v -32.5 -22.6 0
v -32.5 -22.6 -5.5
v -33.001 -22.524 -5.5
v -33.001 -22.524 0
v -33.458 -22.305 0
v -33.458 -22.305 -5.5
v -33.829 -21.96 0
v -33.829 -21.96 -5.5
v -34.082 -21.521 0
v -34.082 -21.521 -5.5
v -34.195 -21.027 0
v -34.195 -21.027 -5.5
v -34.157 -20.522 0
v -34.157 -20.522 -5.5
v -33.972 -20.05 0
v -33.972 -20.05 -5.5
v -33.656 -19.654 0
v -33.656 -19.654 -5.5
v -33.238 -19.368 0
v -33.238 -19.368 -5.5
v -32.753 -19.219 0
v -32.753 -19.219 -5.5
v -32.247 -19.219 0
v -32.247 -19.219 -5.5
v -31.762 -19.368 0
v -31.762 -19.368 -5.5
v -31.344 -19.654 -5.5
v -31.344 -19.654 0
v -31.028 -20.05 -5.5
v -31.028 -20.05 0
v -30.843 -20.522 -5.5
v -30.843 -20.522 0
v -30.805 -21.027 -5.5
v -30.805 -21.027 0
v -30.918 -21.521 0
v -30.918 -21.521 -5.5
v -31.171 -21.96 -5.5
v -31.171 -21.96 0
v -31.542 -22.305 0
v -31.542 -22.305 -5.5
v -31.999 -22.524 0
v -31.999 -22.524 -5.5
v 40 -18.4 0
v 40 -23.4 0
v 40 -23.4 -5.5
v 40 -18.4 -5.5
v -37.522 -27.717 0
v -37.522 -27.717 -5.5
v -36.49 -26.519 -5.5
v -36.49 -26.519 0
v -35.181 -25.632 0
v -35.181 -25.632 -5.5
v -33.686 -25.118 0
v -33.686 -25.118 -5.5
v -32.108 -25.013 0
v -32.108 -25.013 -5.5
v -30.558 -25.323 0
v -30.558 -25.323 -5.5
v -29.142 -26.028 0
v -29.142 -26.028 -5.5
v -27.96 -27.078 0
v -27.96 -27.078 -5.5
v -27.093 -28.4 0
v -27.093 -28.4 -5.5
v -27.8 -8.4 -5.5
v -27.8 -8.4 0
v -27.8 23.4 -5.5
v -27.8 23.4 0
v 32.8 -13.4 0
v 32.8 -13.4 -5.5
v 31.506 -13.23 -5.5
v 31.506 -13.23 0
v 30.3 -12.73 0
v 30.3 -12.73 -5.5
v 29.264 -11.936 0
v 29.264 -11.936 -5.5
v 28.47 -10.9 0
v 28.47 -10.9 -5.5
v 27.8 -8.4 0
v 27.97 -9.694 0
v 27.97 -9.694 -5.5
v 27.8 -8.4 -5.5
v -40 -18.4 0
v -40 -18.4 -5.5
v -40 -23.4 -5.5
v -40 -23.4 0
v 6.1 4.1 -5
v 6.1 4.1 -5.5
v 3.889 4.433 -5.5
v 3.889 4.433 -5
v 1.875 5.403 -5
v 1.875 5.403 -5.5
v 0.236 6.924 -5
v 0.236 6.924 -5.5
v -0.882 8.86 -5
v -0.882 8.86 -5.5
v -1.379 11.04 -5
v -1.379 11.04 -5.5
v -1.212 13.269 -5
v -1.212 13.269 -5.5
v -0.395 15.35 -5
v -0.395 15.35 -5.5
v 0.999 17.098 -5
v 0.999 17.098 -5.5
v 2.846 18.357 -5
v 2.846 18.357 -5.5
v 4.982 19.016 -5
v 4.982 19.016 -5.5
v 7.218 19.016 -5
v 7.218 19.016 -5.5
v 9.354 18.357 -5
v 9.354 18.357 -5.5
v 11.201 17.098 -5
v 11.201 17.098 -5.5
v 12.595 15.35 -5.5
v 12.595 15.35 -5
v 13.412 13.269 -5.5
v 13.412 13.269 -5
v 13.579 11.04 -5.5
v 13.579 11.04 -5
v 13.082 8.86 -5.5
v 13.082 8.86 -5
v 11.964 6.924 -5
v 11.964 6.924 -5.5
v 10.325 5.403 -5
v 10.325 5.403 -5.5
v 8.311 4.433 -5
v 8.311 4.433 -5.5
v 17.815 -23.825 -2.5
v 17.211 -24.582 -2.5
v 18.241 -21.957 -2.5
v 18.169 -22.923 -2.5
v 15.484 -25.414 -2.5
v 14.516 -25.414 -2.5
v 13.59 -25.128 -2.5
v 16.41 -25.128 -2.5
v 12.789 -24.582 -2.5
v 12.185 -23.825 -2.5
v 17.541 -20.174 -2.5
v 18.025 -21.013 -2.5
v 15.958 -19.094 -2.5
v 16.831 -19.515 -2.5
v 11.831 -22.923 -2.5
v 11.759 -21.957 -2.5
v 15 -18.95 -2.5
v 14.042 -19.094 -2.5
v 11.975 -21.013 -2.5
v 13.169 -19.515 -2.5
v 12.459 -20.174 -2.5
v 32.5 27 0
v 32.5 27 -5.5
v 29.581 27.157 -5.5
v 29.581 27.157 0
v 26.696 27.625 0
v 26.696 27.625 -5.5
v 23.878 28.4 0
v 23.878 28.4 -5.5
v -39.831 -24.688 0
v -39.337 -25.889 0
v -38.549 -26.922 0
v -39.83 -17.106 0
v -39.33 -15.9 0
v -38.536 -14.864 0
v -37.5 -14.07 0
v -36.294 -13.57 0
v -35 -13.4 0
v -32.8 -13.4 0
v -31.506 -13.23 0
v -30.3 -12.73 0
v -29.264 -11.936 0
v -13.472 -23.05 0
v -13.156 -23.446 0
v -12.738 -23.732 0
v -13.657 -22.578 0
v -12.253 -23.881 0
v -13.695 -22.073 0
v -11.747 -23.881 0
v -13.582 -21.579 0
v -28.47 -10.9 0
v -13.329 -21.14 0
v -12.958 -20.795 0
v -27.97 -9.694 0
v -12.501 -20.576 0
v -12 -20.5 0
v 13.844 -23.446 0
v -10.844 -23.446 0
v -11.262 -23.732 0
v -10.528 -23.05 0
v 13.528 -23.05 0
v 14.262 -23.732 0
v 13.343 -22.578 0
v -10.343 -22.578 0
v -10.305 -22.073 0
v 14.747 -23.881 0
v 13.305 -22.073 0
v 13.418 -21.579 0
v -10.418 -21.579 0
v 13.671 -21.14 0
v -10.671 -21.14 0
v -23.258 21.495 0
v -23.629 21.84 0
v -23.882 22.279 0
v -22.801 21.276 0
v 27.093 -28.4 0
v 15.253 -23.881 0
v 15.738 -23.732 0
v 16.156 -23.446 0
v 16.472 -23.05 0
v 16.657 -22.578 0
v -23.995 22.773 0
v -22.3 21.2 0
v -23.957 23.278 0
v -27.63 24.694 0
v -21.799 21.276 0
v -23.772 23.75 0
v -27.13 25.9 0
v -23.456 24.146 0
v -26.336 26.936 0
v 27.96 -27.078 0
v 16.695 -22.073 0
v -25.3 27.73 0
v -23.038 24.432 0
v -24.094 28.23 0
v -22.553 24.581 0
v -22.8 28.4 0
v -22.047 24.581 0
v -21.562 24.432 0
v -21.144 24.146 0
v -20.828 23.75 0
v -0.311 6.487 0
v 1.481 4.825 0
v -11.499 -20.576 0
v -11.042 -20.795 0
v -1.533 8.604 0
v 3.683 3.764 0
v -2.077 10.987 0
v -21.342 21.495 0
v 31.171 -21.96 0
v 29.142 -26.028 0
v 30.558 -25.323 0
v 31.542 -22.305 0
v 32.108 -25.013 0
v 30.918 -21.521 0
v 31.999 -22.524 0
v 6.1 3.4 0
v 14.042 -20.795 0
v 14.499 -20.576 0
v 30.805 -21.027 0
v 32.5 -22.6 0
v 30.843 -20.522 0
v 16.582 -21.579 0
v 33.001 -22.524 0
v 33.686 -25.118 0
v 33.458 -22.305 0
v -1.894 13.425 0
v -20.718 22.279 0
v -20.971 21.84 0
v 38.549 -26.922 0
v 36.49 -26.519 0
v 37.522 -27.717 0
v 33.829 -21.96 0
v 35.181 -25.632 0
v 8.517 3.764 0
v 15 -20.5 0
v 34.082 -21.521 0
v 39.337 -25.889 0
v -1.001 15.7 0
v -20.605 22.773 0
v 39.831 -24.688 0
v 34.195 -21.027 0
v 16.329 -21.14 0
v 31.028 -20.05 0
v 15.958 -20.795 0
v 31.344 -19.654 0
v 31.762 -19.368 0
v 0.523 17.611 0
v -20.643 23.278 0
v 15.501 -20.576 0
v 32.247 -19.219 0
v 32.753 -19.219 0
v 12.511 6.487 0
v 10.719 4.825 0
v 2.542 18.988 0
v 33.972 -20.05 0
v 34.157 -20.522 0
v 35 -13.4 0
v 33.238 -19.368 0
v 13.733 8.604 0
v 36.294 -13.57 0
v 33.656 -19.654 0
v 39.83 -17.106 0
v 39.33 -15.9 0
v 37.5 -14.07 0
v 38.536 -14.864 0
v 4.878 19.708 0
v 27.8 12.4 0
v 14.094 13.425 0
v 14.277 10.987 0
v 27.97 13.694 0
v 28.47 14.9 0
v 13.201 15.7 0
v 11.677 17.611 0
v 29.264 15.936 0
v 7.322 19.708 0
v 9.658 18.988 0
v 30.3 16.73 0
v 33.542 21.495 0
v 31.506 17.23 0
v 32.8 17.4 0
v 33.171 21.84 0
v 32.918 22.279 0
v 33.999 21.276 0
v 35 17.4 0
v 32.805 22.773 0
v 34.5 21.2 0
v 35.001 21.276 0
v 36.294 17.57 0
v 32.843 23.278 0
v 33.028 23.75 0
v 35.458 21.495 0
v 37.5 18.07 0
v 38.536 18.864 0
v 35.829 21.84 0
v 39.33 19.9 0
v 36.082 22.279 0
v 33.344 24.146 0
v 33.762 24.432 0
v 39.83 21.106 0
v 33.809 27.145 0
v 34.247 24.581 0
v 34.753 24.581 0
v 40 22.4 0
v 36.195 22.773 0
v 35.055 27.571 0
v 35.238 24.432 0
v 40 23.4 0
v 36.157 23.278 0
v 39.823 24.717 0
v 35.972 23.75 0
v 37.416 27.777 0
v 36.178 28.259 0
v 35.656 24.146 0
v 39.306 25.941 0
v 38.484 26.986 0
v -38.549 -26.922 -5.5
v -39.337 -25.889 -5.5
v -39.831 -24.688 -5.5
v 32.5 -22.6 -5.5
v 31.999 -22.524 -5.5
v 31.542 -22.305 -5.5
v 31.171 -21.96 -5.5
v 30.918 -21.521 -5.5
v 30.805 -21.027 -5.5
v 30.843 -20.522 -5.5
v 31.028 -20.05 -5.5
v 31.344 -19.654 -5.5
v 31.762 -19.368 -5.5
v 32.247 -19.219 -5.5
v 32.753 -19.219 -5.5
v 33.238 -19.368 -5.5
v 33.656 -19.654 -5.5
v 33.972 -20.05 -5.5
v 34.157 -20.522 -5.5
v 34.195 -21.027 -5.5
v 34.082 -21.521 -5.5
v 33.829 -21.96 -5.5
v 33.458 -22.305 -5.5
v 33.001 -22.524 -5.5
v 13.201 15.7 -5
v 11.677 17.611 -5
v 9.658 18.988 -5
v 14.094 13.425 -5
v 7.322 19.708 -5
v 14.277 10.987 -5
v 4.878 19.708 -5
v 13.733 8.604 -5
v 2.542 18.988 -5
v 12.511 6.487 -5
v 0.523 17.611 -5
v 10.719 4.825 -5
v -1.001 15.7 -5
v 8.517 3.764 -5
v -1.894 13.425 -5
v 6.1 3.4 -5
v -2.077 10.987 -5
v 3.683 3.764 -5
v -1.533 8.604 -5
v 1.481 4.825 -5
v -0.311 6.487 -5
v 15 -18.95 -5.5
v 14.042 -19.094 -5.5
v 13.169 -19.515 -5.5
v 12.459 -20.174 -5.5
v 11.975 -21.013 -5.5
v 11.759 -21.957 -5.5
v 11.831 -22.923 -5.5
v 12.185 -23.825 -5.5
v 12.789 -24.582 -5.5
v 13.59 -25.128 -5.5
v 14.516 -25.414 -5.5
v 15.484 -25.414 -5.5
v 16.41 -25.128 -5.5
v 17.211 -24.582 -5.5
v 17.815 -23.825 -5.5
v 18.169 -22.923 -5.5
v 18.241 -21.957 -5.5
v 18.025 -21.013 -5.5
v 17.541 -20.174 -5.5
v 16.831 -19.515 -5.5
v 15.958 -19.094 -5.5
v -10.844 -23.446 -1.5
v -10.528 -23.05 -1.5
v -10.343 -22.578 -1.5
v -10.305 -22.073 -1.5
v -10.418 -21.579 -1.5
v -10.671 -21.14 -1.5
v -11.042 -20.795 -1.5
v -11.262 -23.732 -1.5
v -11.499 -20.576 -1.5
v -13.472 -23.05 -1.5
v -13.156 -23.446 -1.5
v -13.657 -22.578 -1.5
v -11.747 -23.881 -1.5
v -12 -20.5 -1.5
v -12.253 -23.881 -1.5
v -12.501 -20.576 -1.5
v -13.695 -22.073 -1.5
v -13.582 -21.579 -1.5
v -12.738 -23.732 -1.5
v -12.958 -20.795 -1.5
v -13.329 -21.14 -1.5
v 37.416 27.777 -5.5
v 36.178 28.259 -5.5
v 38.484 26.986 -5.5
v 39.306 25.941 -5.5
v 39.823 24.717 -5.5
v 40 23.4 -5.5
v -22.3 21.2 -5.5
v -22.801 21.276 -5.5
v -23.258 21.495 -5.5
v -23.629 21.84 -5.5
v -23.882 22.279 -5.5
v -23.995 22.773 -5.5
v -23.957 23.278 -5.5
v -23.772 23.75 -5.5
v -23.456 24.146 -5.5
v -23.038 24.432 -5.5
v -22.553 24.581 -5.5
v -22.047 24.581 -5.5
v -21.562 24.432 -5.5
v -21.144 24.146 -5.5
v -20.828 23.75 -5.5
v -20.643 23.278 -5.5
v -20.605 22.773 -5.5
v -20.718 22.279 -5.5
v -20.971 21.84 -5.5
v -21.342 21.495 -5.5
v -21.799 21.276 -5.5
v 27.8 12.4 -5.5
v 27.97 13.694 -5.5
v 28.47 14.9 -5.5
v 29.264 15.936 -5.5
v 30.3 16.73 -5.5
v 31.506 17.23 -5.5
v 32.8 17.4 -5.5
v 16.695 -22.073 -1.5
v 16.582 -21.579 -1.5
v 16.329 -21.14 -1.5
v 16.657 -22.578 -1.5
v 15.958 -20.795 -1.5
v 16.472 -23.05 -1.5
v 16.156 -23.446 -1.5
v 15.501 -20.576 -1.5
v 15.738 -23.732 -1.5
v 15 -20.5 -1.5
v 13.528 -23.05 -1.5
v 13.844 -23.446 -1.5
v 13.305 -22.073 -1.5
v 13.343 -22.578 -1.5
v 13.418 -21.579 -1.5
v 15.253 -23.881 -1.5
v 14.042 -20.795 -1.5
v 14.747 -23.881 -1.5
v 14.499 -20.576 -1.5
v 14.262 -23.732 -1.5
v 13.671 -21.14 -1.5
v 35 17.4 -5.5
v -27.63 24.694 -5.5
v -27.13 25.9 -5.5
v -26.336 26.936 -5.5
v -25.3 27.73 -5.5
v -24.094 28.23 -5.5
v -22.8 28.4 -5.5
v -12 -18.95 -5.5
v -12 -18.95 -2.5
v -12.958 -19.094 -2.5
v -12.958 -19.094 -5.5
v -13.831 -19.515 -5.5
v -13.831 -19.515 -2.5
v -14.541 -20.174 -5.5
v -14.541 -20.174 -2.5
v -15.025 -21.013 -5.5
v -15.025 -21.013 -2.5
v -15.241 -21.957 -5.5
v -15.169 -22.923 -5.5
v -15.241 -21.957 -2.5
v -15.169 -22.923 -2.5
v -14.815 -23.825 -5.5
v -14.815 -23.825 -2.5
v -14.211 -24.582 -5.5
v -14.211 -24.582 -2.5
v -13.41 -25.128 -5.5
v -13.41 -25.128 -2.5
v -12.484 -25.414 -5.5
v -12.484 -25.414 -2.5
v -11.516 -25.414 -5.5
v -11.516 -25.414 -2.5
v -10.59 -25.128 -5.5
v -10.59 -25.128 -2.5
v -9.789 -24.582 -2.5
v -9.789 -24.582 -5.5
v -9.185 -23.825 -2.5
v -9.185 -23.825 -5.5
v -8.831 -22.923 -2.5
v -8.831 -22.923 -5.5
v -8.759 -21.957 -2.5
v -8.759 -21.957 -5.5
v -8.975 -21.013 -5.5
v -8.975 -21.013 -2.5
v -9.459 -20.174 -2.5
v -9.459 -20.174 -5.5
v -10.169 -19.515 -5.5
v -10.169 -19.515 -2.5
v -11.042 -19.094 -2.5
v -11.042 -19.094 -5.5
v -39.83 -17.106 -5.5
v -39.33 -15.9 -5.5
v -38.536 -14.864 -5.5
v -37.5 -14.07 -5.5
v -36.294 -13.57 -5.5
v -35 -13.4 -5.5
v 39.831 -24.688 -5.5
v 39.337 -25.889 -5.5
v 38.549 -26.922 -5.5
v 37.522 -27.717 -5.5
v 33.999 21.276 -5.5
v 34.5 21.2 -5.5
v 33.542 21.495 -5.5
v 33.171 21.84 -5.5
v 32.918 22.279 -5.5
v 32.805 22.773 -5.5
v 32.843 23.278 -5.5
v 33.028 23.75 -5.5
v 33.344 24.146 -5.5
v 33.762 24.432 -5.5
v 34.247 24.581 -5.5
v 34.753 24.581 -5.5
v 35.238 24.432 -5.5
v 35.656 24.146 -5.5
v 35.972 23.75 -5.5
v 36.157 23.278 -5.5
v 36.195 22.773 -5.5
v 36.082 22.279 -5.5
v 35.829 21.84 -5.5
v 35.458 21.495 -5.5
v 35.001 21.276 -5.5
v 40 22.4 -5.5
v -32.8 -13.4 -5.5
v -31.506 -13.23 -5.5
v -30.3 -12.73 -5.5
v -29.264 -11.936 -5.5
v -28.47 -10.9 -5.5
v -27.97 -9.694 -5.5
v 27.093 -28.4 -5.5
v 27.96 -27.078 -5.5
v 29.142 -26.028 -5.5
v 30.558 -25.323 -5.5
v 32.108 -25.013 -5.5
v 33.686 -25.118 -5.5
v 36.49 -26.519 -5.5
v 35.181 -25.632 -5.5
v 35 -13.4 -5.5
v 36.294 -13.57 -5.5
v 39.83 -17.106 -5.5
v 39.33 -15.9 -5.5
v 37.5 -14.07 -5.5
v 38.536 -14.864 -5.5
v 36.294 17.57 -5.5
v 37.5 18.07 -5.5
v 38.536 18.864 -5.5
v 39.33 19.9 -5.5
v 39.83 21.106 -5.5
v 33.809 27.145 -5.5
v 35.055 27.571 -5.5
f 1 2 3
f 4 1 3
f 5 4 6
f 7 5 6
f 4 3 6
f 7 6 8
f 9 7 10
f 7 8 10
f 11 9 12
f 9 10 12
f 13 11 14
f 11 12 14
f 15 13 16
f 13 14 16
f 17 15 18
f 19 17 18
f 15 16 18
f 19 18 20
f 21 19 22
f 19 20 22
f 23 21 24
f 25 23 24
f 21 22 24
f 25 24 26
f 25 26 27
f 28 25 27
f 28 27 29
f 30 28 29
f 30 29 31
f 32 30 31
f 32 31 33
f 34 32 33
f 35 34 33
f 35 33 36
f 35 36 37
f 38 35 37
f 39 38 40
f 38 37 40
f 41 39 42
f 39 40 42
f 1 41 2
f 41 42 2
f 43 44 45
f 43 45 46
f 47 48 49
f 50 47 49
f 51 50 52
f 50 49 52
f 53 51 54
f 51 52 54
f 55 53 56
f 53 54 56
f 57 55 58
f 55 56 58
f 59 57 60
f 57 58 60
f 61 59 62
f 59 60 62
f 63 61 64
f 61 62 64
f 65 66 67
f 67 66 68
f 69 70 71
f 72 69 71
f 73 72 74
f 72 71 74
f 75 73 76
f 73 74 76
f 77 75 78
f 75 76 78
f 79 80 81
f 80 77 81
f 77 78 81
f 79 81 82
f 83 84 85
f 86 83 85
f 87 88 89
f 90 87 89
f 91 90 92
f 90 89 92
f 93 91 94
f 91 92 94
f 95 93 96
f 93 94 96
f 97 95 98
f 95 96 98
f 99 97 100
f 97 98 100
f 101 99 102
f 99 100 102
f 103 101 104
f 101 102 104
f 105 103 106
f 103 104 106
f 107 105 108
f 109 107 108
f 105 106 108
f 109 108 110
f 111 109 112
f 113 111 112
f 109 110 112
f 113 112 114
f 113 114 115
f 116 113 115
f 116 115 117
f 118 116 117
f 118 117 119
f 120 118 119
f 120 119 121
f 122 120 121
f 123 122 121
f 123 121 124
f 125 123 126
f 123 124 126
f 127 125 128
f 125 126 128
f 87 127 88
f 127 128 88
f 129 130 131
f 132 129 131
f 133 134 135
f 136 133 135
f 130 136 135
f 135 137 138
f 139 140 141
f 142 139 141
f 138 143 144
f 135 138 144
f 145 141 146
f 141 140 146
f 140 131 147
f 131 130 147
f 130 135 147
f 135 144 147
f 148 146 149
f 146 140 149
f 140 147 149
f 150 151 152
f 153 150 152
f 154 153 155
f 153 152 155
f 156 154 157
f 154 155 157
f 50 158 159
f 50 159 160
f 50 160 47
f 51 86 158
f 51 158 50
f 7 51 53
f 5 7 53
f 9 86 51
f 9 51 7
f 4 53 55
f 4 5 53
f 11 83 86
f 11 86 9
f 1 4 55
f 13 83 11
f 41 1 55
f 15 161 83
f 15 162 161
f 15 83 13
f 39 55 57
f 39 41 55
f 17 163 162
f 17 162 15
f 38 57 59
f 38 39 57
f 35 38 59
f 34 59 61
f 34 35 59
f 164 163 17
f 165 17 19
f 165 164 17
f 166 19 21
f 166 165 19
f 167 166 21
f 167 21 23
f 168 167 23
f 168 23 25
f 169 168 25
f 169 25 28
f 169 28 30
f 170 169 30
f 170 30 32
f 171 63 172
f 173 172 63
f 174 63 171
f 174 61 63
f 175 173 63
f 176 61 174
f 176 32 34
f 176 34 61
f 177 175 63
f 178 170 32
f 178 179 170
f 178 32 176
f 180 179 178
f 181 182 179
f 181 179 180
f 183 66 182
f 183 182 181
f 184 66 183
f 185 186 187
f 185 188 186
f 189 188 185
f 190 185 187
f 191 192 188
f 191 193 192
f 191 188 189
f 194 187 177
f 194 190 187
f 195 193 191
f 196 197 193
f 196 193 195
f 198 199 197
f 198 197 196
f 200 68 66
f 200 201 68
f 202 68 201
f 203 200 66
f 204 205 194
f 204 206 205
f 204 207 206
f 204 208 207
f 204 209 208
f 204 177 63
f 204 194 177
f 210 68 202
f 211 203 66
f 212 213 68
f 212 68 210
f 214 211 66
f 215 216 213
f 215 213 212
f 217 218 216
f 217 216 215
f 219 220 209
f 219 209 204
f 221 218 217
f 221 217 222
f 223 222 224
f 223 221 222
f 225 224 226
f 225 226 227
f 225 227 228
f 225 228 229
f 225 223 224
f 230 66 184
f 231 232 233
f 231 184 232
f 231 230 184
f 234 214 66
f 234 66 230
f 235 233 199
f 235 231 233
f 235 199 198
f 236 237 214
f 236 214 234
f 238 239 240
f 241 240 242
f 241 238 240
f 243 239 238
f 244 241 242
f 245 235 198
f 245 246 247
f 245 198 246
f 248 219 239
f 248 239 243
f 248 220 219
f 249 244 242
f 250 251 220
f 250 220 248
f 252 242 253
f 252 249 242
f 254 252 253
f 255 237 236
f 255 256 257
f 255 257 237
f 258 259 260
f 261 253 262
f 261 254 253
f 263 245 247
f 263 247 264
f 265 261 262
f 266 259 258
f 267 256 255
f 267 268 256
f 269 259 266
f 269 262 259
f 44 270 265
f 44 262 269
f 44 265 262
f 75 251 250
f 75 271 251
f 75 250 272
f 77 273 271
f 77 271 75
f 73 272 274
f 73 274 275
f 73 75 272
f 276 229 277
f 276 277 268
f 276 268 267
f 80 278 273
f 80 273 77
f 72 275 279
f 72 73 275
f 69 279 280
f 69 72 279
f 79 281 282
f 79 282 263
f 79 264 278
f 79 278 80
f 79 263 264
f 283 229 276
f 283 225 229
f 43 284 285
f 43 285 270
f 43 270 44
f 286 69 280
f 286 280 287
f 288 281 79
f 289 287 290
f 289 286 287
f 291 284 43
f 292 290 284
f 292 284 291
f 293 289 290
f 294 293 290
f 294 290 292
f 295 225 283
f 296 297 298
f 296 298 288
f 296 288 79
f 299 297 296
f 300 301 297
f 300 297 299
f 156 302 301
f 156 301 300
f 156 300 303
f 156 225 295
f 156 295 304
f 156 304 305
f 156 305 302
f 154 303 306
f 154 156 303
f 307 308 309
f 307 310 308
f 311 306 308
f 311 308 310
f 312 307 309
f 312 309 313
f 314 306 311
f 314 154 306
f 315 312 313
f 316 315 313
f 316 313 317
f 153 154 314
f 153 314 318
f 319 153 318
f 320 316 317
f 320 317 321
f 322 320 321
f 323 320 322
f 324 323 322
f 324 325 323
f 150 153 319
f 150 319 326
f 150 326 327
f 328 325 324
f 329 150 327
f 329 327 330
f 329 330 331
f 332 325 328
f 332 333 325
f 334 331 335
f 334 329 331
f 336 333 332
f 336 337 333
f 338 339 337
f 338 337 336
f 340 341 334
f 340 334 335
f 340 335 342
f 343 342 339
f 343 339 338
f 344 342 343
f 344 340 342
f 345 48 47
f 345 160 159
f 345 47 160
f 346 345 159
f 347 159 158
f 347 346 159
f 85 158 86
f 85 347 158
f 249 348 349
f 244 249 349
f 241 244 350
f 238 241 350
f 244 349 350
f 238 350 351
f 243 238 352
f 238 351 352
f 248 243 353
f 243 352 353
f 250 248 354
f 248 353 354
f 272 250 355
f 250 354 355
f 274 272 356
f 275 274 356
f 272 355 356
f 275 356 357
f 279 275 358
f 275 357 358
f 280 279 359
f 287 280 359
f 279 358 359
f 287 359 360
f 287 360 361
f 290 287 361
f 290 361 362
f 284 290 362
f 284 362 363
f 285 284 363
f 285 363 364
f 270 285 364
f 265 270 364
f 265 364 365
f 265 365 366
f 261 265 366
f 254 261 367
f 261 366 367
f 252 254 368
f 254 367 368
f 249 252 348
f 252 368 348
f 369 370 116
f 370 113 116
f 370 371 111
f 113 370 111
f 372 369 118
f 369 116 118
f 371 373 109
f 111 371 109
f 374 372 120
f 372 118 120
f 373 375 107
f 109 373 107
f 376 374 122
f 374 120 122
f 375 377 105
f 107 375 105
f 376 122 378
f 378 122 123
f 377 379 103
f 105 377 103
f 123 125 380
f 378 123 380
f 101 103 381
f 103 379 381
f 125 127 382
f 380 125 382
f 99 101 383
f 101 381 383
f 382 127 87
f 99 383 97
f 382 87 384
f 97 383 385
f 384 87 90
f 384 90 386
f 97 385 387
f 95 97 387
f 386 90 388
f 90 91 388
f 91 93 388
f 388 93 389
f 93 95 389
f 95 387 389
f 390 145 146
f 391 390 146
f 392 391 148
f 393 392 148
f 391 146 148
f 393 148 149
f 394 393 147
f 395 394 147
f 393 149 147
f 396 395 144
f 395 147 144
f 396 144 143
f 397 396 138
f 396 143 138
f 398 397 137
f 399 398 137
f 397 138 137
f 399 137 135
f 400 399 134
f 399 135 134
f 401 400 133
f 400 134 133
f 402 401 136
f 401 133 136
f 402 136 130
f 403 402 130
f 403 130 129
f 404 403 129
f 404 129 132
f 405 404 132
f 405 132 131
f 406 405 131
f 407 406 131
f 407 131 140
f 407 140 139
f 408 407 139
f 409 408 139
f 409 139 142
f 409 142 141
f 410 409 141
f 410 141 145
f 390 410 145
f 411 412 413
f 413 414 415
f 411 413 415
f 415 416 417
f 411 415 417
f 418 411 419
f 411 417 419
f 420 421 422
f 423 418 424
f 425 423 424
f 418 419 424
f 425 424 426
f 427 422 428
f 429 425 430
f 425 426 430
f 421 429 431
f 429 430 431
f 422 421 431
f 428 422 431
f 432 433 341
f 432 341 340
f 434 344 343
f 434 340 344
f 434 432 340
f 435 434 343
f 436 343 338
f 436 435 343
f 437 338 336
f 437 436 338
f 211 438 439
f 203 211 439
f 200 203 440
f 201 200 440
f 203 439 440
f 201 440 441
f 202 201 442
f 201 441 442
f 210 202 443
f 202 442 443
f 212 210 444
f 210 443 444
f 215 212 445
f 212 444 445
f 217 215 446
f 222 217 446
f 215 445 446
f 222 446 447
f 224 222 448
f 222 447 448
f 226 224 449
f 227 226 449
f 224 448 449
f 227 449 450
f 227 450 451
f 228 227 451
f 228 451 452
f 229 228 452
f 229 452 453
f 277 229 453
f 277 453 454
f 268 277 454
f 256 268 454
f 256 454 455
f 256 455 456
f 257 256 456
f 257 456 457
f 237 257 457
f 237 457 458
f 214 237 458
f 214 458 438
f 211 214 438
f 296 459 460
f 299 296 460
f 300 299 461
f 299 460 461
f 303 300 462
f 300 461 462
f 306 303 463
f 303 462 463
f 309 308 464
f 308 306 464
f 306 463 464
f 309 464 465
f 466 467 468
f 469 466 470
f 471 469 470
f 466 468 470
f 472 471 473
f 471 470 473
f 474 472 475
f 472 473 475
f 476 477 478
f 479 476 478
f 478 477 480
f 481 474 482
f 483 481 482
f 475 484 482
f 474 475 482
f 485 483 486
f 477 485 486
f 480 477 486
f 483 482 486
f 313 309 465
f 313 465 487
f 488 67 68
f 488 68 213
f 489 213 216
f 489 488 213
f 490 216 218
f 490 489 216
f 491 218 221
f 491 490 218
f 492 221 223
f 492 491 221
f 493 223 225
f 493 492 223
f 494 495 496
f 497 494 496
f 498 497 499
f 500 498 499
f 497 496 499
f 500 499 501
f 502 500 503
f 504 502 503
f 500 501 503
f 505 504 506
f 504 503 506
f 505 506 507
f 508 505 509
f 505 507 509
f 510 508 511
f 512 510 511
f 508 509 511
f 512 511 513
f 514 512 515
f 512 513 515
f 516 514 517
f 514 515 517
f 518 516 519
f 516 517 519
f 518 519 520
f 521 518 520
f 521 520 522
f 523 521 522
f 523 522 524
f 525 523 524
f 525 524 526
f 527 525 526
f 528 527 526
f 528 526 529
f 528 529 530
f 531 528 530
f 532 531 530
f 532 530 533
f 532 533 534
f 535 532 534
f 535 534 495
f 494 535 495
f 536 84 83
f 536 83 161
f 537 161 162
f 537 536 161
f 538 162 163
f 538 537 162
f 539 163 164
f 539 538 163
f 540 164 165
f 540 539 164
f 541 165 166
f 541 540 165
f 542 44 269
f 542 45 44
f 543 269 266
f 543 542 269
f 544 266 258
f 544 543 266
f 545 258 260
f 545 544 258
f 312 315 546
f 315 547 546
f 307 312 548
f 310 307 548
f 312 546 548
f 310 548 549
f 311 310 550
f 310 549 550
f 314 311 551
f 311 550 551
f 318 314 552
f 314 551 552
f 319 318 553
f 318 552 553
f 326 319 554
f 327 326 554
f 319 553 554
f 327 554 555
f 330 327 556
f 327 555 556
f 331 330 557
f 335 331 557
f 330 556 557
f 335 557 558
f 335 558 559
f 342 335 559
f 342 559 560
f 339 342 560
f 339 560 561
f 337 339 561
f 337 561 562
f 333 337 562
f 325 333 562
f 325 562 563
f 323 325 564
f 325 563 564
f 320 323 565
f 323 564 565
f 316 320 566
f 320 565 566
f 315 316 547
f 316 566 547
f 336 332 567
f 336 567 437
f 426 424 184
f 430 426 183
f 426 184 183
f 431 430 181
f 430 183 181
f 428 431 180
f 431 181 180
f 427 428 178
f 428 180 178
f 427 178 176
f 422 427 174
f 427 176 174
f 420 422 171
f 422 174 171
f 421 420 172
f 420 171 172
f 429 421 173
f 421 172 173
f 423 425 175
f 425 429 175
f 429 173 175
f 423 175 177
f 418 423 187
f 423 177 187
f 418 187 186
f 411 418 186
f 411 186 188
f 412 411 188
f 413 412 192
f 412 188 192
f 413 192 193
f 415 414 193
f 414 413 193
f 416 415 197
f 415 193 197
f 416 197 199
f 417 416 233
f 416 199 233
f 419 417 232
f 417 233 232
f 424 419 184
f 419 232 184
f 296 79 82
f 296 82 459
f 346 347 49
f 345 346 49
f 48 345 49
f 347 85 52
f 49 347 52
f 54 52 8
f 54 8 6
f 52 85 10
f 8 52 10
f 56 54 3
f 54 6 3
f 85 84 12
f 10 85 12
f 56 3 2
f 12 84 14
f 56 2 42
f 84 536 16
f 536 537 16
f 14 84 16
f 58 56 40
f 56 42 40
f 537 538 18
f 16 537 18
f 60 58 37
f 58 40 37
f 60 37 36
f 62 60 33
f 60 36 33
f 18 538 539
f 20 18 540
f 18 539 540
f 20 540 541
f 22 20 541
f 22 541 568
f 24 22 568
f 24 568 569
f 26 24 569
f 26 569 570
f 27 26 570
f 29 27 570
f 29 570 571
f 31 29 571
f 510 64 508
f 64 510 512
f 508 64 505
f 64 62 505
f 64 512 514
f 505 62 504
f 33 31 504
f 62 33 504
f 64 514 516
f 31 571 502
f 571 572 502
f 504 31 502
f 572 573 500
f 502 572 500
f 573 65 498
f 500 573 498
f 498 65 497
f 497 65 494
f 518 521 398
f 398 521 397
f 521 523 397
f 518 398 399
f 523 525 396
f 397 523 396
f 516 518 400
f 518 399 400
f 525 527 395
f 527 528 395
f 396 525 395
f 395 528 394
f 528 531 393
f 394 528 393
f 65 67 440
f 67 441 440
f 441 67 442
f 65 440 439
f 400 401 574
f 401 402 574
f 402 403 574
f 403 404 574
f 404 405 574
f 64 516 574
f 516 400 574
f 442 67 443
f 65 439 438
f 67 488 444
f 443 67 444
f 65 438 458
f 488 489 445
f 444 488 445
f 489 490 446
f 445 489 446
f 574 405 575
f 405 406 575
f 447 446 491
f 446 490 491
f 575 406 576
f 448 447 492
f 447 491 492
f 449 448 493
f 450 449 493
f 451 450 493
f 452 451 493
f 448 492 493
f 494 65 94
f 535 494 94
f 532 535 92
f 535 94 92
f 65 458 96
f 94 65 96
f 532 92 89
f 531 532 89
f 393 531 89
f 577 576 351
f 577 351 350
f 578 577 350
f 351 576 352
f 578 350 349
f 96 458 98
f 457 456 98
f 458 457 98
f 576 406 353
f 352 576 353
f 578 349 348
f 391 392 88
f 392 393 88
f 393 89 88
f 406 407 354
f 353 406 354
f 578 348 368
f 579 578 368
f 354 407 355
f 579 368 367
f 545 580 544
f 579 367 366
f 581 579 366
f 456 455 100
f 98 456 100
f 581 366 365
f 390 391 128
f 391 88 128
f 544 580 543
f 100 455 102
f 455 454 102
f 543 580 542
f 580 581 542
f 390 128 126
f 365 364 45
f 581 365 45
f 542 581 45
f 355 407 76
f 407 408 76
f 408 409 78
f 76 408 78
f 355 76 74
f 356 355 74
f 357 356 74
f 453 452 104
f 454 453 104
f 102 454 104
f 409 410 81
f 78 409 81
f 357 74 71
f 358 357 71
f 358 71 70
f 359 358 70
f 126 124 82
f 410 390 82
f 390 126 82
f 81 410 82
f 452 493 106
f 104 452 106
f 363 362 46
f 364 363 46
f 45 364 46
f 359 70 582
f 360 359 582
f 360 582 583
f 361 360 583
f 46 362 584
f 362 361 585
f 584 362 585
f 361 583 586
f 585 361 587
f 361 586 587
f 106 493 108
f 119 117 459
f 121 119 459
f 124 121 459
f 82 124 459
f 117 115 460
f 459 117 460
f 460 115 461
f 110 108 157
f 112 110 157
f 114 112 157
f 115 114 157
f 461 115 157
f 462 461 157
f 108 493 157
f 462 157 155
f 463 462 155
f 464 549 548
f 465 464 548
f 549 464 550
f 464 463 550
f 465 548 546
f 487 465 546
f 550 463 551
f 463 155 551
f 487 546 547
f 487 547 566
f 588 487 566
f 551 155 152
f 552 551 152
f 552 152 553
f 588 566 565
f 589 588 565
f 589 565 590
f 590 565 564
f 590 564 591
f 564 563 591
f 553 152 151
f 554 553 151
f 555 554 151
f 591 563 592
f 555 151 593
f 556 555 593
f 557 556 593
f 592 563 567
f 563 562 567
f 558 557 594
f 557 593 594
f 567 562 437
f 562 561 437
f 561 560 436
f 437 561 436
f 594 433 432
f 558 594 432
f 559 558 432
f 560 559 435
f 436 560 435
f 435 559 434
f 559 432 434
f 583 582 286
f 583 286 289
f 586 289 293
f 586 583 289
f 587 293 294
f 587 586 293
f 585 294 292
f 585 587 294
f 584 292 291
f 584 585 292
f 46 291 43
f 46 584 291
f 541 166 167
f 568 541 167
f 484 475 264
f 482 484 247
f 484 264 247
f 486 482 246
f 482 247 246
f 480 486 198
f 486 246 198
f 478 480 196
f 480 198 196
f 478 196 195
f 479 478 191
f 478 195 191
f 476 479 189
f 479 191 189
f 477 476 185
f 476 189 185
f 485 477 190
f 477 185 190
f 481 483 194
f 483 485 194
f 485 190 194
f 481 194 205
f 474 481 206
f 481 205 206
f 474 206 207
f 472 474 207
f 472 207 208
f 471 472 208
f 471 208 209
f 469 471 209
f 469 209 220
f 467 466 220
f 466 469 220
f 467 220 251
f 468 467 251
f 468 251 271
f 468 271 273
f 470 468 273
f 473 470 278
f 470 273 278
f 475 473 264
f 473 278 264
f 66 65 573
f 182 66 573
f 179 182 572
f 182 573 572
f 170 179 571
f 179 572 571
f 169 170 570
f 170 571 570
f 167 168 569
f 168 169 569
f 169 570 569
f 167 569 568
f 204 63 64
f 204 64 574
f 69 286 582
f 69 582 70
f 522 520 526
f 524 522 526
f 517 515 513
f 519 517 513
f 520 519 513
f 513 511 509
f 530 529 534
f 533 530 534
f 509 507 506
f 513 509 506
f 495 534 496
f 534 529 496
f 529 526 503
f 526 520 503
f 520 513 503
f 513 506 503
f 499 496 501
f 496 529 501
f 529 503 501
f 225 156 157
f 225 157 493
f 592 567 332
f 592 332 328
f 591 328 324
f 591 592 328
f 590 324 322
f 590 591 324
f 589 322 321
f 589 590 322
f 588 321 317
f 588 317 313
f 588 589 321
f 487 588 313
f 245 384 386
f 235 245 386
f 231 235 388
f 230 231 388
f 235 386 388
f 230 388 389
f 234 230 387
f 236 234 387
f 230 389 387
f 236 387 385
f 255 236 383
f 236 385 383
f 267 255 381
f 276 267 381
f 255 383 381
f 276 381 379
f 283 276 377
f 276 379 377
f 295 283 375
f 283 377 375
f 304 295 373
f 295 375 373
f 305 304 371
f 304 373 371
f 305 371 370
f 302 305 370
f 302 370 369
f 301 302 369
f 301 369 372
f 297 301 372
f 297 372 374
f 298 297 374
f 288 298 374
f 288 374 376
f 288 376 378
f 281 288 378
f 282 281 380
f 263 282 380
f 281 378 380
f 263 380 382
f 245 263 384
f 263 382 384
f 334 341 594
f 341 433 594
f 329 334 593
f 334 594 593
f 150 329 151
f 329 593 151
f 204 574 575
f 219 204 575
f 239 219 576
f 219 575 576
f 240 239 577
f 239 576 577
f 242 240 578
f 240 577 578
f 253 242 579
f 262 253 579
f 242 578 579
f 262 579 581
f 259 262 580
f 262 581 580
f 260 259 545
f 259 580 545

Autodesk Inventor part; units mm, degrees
ref_plane "YZ Plane" through (0, 0, 0) normal (1, 0, 0) x (0, 1, 0)
ref_plane "XZ Plane" through (0, 0, 0) normal (0, 1, 0) x (-1, 0, 0)
ref_plane "XY Plane" through (0, 0, 0) normal (0, 0, 1) x (1, 0, 0)
sketch "Sketch1" plane through (0, 0, 0) normal (0, 0, 1) x (1, 0, 0)
  line L0 (-40, -28.4) -> (40, -28.4)
  line L1 (40, -28.4) -> (40, 28.4)
  line L2 (40, 28.4) -> (-40, 28.4)
  line L3 (-40, 28.4) -> (-40, -28.4)
  line L4 (-40, -28.4) -> (40, 28.4) construction
  line L5 (40, -28.4) -> (-40, 28.4) construction
  line L6 (-32.5, -20.9) -> (32.5, -20.9) construction
  line L7 (32.5, -20.9) -> (32.5, 20.9) construction
  line L8 (32.5, 20.9) -> (-32.5, 20.9) construction
  line L9 (-32.5, 20.9) -> (-32.5, -20.9) construction
  line L10 (-32.5, -20.9) -> (32.5, 20.9) construction
  line L11 (32.5, -20.9) -> (-32.5, 20.9) construction
  circle A0 centre (-32.5, -20.9) radius 3.25 construction
  circle A1 centre (32.5, 20.9) radius 3.25 construction
  circle A2 centre (32.5, -20.9) radius 3.25 construction
  line L12 (-40, -13.4) -> (-27.8, -13.4)
  line L13 (-27.8, -13.4) -> (-27.8, 28.4)
  circle A3 centre (-20.3, 20.9) radius 3.25 construction
  line L14 (40, 28.4) -> (32.5, 20.9)
  line L15 (-27.8, 28.4) -> (-20.3, 20.9) construction
  point P0 (0, 0)
  point P1 (34.5, 22.9)
  point P2 (-22.3, 22.9)
  dimension "d0" = 80
  dimension "d1" = 56.8
  dimension "d2" = 41.8
  dimension "d3" = 65
  dimension "d4" = 6.5
  dimension "d5" = 6.5
  dimension "d6" = 6.5
  dimension "d8" = 7.5
  dimension "d9" = 7.5
  dimension "d10" = 7.5
  dimension "d11" = 12.2
  dimension "d12" = 6.5
  dimension "d13" = 7.5
  dimension "d61" = 5.5
  dimension "d62" = 5.5
extrude "Base" add sketch "Sketch1" against normal blind 5.5 contours L3 L12 L13 L2 L1 L0
hole "Mounting Holes" at (32.5, -20.9, 0) at (-32.5, -20.9, 0) at (34.5, 22.9, 0) at (-22.3, 22.9, 0) direction (0, 0, -1) diameter 3.4 end through all clearance for "Socket Head Cap Screw" size "M3" standard "Ansi Metric M Profile"
fillet "Fillet1" radius 5 6 edges at (-40, -28.4, -2.75) (-40, -13.4, -2.75) (-27.8, -13.4, -2.75) (-27.8, 28.4, -2.75) (40, 28.4, -2.75) (40, -28.4, -2.75)
sketch "Sketch2" plane through (0, 0, 0) normal (0, 0, 1) x (1, 0, 0)
  circle A0 centre (32.5, -20.9) radius 1.7 projected
  point P0 (0, 0)
  point P1 (6.1, -6.4)
  point P2 (6.1, 11.6)
  dimension "d24" = 6.1
  dimension "d26" = 18
  dimension "d63" = 14.5
hole "Bearing Bore" at (6.1, 11.6, 0) direction (0, 0, -1) diameter 15 end through all counterbore diameter 16.4 counterbore depth 5
sketch "Sketch8" plane through (0, 0, 0) normal (0, 0, 1) x (1, 0, 0)
  line L0 (27.8, 17.4) -> (40, 17.4)
  line L1 (40, 17.4) -> (40, -13.4)
  line L2 (40, -13.4) -> (27.8, -13.4)
  line L3 (27.8, -13.4) -> (27.8, 17.4)
  line L4 (27.8, 17.4) -> (40, -13.4) construction
  line L5 (40, 17.4) -> (27.8, -13.4) construction
  circle A0 centre (34.5, 22.9) radius 1.7 projected
  circle A1 centre (32.5, -20.9) radius 1.7 projected
  line L6 (40, -23.4) -> (40, 23.4) projected
  line L7 (-35, -28.4) -> (35, -28.4) projected
  point P0 (0, 0)
  point P1 (33.9, 2)
  dimension "d73" = 12.2
  dimension "d77" = 15
  dimension "d78" = 7.5
  dimension "d79" = 5.5
extrude "Clamp Clearance" cut sketch "Sketch8" against normal blind 10 contours L0 L1 L2 L3
fillet "Fillet3" radius 5 2 edges at (40, 17.4, -2.75) (40, -13.4, -2.75)
sketch "Sketch9" plane through (0, 0, -5.5) normal (0, 0, -1) x (-1, 0, 0)
  circle A0 centre (-34.5, 22.9) radius 1.7 projected
  arc A1 (-32.5, 33) -> (-22.5, 35.5) centre (-32.5, 54.25) ccw construction
  arc A2 (-32.5, 27) -> (-19.6765, 30.2059) centre (-32.5, 54.25) ccw
  arc A3 (-32.5, 39) -> (-25.3235, 40.7941) centre (-32.5, 54.25) ccw
  arc A4 (-32.5, 39) -> (-32.5, 27) centre (-32.5, 33) ccw
  arc A5 (-19.6765, 30.2059) -> (-25.3235, 40.7941) centre (-22.5, 35.5) ccw
  circle A6 centre (-32.5, -31) radius 6
  circle A7 centre (32.5, -31) radius 6
  circle A8 centre (-32.5, -20.9) radius 1.7 projected
  circle A9 centre (32.5, -20.9) radius 1.7 projected
  point P0 (0, 0)
  dimension "d80" = 2
  dimension "d81" = 10.1
  dimension "d82" = 6
  dimension "d83" = 10
  dimension "d84" = 2.5
  dimension "d85" = 15.25
  dimension "d86" = 10.1
  dimension "d87" = 10.1
  dimension "d88" = 12
extrude "Bolt Clearance" cut sketch "Sketch9" against normal blind 10 contours A4 A3 A5 A2 | A6 | A7
sketch "Sketch10" plane through (0, 0, -5.5) normal (0, 0, -1) x (-1, 0, 0)
  line L0 (-27.0926, -28.4) -> (27.0926, -28.4) projected
  circle A0 centre (-6.1, 11.6) radius 7.5 projected
  point P0 (0, 0)
  point P1 (-15, -22.2)
  point P2 (12, -22.2)
  dimension "d91" = 6.2
  dimension "d92" = 6.2
  dimension "d102" = 15
  dimension "d103" = 12
hole "Lower Block Holes" at (15, -22.2, -5.5) at (-12, -22.2, -5.5) direction (0, 0, 1) diameter 3.4 end through all counterbore diameter 6.5 counterbore depth 3 clearance for "Socket Head Cap Screw" size "M3" standard "Ansi Metric M Profile"
sketch "Sketch11" plane through (15, -22.2, -2.5) normal (0, 0, -1) x (-1, 0, 0)
  circle A0 centre (0, 0) radius 1.7 projected
  circle A1 centre (27, 0) radius 1.7 projected
  point P0 (15, 22.2)
extrude "Print Feature" add sketch "Sketch11" against normal blind 1
fillet "Fillet4" radius 5 2 edges at (27.8, -13.4, -2.75) (27.8, 17.4, -2.75)
equation "\"d13\" = d10"
properties part number "Extruder Mount Plate 2" material "ABS Plastic"
